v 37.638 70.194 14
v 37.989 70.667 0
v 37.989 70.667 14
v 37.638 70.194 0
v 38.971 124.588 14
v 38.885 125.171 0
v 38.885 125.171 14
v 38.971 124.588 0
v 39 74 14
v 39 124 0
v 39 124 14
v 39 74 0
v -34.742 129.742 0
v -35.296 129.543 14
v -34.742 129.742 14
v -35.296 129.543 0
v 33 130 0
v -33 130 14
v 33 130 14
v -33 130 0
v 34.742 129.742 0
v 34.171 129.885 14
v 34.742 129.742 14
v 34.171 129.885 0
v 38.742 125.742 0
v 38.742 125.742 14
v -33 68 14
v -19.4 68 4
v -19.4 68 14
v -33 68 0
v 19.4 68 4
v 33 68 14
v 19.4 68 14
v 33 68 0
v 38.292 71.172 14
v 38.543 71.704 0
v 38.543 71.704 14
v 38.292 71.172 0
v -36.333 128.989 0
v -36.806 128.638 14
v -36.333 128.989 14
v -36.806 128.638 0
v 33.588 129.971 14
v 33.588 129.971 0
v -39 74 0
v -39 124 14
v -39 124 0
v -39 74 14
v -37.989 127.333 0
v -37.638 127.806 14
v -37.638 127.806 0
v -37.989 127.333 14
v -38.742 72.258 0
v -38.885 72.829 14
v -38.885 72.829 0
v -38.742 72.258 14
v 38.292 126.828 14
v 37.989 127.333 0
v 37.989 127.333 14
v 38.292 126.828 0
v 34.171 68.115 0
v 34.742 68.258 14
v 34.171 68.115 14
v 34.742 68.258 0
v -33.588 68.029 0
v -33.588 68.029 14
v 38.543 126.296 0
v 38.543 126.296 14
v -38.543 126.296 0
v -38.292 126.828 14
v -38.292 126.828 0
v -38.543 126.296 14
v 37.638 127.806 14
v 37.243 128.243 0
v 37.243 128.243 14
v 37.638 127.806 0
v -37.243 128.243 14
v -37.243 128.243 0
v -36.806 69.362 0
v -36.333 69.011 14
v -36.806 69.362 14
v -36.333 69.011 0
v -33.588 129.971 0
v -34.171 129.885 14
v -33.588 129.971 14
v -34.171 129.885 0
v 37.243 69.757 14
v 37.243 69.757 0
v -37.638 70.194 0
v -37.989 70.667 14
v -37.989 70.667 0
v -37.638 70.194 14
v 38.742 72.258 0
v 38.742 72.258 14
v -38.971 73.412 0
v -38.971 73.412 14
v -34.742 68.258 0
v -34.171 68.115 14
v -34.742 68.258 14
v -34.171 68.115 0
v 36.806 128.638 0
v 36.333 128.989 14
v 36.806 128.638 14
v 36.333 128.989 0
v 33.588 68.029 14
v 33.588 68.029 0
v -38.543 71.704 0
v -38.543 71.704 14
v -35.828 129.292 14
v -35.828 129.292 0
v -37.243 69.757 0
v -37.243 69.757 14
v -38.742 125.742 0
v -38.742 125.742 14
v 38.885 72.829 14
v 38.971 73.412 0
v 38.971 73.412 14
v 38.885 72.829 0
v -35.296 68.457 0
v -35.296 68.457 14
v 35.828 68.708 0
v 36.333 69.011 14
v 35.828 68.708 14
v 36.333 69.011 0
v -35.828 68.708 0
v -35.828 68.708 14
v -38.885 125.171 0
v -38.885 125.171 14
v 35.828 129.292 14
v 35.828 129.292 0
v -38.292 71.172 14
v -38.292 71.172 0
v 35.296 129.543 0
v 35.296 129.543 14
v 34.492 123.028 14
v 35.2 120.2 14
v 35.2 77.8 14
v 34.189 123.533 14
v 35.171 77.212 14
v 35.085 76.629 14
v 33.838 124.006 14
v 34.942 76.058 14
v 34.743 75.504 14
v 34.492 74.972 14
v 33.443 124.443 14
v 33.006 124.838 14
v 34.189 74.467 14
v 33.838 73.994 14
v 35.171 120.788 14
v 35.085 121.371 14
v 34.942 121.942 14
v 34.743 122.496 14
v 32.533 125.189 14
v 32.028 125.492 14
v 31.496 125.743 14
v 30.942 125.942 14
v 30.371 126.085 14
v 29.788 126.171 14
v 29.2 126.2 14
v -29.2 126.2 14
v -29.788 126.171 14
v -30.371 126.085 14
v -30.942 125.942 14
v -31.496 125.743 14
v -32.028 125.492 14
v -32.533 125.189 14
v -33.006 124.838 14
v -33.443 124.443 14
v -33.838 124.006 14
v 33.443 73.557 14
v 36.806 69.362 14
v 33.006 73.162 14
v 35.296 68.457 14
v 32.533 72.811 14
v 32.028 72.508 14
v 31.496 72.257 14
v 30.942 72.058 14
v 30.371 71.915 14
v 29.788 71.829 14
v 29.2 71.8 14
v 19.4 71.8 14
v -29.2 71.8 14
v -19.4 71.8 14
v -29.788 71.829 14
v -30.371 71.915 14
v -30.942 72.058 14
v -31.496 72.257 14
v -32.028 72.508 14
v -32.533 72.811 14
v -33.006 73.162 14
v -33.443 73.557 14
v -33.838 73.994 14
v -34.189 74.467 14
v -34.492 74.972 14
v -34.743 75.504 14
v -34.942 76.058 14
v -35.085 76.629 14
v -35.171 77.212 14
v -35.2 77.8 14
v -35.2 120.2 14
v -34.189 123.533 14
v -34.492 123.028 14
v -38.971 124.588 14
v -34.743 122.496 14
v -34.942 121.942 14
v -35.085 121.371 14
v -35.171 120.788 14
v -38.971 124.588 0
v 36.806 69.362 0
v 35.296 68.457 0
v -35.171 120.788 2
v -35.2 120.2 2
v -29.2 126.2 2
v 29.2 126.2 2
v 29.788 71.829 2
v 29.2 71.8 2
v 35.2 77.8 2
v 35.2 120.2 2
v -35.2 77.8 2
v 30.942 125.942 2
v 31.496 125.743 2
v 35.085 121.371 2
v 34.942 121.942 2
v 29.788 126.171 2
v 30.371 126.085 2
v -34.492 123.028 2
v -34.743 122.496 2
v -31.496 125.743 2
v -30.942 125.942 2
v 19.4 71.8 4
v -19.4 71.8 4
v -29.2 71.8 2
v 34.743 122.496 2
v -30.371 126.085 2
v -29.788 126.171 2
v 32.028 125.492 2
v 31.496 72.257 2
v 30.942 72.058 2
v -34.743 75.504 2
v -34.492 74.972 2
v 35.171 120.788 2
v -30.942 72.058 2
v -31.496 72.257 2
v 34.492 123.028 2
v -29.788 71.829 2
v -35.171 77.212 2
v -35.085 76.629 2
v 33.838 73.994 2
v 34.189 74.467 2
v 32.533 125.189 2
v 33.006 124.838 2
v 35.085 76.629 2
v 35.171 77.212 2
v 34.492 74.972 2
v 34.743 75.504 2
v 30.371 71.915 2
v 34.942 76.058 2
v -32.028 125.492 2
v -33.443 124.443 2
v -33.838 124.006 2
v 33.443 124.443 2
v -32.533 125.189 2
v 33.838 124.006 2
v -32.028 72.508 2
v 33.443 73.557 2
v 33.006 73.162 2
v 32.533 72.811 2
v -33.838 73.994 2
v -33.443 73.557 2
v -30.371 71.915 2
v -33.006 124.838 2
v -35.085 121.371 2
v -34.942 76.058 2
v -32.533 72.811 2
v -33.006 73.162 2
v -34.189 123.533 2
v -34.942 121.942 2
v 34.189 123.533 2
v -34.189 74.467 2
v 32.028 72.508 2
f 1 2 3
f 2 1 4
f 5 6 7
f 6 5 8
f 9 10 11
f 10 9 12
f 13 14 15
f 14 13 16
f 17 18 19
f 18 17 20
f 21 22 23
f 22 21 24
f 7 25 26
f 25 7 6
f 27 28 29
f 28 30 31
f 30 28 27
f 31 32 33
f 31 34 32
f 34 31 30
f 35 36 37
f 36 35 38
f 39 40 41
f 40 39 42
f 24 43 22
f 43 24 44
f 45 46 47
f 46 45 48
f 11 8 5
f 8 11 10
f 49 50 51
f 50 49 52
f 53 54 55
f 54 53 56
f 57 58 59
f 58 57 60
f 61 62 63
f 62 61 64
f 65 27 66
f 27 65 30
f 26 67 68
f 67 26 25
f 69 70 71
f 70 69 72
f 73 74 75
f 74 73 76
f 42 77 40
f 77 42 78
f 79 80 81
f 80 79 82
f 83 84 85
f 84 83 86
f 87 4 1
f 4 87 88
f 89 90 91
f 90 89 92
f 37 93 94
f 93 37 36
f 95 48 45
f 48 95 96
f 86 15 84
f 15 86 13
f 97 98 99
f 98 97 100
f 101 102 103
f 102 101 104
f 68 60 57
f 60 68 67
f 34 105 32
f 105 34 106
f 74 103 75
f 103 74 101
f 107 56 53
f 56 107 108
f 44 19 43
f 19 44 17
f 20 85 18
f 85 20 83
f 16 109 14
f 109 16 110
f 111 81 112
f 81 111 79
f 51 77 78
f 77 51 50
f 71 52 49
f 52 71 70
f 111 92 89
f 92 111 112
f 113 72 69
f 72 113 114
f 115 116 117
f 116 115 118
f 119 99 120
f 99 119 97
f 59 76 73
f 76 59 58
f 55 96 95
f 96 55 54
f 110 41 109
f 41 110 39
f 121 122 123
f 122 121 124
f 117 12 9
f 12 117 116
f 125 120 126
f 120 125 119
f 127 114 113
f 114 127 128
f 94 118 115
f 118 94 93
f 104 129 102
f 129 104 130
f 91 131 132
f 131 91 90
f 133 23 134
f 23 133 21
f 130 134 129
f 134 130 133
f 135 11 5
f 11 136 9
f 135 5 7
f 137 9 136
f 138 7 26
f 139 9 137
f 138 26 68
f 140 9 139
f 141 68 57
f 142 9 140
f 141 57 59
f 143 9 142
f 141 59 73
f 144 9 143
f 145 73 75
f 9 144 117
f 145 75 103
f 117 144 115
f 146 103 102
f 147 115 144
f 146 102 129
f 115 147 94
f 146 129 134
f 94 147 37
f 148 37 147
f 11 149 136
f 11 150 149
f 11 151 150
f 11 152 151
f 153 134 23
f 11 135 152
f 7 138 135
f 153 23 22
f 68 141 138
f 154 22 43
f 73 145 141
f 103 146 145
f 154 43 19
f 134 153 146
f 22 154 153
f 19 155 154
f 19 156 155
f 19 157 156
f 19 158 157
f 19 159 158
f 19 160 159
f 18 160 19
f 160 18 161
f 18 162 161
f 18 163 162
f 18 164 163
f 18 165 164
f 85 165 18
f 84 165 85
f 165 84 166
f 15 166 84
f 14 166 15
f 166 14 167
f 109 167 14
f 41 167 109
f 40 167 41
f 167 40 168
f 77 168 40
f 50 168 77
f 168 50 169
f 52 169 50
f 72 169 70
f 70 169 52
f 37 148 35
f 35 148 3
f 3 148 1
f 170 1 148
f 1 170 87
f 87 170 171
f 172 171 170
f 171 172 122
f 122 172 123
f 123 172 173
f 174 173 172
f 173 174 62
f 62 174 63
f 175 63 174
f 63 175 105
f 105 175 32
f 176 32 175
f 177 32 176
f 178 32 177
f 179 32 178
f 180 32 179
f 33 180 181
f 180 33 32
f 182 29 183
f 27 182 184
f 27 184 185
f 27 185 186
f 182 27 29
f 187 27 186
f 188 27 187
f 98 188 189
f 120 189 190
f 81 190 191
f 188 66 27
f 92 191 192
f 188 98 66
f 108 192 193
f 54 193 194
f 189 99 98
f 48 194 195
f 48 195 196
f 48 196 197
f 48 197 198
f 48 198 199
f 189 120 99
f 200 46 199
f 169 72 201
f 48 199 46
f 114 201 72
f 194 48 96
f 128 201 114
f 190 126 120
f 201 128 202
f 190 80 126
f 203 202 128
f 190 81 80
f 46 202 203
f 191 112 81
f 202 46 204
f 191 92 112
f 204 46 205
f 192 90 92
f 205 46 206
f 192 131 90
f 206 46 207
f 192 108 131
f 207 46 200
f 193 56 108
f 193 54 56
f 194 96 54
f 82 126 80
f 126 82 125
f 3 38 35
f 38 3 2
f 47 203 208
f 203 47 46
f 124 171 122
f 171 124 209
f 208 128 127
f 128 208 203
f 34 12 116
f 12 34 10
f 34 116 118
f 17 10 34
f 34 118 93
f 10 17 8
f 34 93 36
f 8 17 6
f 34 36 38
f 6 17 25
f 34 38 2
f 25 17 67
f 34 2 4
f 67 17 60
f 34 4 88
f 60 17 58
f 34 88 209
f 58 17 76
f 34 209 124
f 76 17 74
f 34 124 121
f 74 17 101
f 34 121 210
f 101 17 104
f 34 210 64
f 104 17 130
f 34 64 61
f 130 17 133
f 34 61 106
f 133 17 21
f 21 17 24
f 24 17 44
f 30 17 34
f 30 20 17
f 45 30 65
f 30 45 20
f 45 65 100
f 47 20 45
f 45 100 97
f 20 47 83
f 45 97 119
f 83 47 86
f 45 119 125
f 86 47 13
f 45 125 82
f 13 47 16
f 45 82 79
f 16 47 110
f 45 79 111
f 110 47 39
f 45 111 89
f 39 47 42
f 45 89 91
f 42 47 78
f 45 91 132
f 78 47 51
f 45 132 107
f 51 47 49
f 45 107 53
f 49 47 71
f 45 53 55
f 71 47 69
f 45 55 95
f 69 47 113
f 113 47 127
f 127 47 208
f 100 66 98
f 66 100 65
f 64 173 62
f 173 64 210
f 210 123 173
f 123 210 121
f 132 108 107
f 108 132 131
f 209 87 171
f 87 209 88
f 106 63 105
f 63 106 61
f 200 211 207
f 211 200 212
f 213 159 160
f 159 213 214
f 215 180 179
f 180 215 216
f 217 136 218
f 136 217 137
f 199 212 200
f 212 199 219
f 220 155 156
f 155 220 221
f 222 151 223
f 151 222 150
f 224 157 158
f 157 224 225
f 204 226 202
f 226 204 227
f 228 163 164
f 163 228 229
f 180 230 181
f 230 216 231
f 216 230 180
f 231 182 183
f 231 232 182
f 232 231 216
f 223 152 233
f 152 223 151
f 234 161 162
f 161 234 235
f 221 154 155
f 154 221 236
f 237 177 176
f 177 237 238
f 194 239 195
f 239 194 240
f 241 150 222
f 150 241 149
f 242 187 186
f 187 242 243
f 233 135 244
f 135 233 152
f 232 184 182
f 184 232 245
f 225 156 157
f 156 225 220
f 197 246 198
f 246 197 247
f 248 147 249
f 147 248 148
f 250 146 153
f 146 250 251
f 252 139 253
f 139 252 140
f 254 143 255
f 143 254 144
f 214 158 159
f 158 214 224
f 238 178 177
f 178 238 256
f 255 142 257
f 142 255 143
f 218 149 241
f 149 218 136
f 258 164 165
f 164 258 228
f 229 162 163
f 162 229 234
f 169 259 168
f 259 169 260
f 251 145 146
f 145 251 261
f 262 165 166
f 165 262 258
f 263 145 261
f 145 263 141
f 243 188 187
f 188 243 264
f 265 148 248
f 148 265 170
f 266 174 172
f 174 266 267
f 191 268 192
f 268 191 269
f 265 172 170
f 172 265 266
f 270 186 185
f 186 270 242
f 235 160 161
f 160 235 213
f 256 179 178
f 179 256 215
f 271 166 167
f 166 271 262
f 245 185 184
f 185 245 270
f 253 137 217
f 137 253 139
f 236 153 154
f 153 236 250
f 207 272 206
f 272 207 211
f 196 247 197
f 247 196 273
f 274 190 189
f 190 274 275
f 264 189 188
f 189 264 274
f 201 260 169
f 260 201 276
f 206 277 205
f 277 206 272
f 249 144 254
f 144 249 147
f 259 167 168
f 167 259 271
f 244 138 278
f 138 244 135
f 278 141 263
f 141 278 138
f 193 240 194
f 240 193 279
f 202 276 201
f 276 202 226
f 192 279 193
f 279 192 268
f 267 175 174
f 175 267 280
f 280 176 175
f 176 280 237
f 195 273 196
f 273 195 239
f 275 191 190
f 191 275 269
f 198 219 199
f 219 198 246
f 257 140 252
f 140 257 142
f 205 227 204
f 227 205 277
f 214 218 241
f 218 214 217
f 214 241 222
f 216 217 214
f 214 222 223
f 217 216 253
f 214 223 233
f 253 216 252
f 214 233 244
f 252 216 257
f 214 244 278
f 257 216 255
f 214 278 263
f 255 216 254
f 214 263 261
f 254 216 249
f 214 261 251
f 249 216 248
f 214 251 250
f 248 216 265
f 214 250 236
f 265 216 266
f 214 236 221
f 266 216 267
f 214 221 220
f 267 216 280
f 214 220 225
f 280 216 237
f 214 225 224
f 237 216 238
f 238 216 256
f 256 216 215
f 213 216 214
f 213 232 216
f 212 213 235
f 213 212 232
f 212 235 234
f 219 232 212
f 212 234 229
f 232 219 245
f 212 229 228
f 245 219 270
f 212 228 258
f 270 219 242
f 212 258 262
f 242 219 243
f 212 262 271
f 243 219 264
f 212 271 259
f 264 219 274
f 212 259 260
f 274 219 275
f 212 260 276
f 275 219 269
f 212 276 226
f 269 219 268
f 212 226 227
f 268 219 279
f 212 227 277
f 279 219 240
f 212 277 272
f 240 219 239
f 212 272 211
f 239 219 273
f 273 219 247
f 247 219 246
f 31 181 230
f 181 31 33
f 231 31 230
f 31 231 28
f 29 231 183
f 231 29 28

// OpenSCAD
// file: lib_v3.scad
// ============================================================================
// Shared geometry helpers for the v3 print set.   include <lib_v3.scad>;
// ============================================================================

// Wedge prism, centred on +X, spanning +/- ang/2, rising from z = 0.
module sector_prism(r, ang, h, seg = 64) {
    steps = max(4, ceil(ang / 2.5));   // ~2.5 deg chords, independent of ang
    linear_extrude(height = h)
        polygon(concat(
            [[0, 0]],
            [for (i = [0 : steps])
                let (a = -ang / 2 + ang * i / steps) [r * cos(a), r * sin(a)]]
        ));
}

// Annular sector prism, centred on +X, rising from z = 0.
module ring_sector(r_in, r_out, ang, h, seg = 64) {
    difference() {
        sector_prism(r_out, ang, h, seg);
        translate([0, 0, -0.05]) cylinder(h = h + 0.1, r = r_in, $fn = seg);
    }
}

module tube(od, id, h) {
    difference() {
        cylinder(h = h, d = od);
        translate([0, 0, -0.05]) cylinder(h = h + 0.1, d = id);
    }
}

// Inward ledge with a 45 deg self-supporting underside. Top face at z_top.
module chamfered_ledge(r_wall, w, z_top) {
    rotate_extrude(convexity = 4)
        polygon([[r_wall - w, z_top],
                 [r_wall,     z_top],
                 [r_wall,     z_top - w]]);
}

// Thin slab used as a hull station for the chute trough.
module station_slab(y, z, w, t = 0.6) {
    translate([-w / 2, y - t / 2, z]) cube([w, t, 0.6]);
}
// file: parameters_v3.scad
// ============================================================================
// Automated Pill Dispenser — v3 "integral deck + open carousel"
// Shared parametric dimensions.   include <parameters_v3.scad>;
//
// z = 0 is the underside of the base body; the base cover hangs below it, so
// the table plane is z = base_z. +Y is the front (chute, tray, camera).
//
// Mechanism: the deck holds the pills in. It has ONE wedge opening. The unit
// parks with the JUST-EMPTIED compartment sitting over that opening, so
// nothing can leak; a 45 deg step sweeps the next compartment across the
// opening and gravity empties it. One servo, no gate, no carousel floor.
//
// Sizing rule that makes the park state leak-proof: the opening's angular
// width must fit inside one compartment's interior with margin to spare, at
// the opening's INNER radius (where a divider subtends the most angle):
//
//     open_deg  <=  360/car_n - 2*asin(div_t / (2*open_r_in)) - 2*park_margin
//     24        <=  45        - 8.6                           - 2*6.2
//
// Widening the opening or moving it inward eats the parking margin.
// ============================================================================

// ---------------------------------------------------------------- print / fit
layer_h        = 0.2;
nozzle_d       = 0.4;
wall           = 3.0;
fit_slip       = 0.35;
fit_press      = 0.10;
m3_pilot_d     = 2.55;
m3_free_d      = 3.35;
m2_pilot_d     = 1.65;
m2_free_d      = 2.30;

// ---------------------------------------------------------------- drum
h_od           = 120.0;
h_id           = h_od - 2 * wall;          // 114
h_ri           = h_id / 2;                 // 57
rim_z          = 94.0;                     // top of the deck body wall

// ---------------------------------------------------------------- deck (A3)
deck_z         = 52.0;                     // deck underside / body split plane
deck_t         = 5.0;                      // structural: the deck IS the drum
deck_top       = deck_z + deck_t;          // 57
deck_fillet    = 1.2;                      // fillet where the wall meets the deck

// The one opening.
open_deg       = 24.0;
open_r_in      = 16.0;
open_r_out     = h_ri;                     // breaches the bore: nothing rides past
open_ctr       = 90.0;                     // front (+Y)
open_relief    = 1.2;                      // lead-in relief on the deck top face

// Centre pilot: the carousel's only bearing. Post on the deck, journal in the
// hub, so the drive shaft never carries weight.
pilot_d        = 10.0;
pilot_engage   = 2.75;

// Body joint: three ears outside the drum. Concentricity between bodies is not
// critical — the running surface and the bore are both on the deck body.
ear_angles     = [30, 150, 270];
ear_w          = 18.0;
ear_out        = 7.0;
ear_t          = 8.0;

// ---------------------------------------------------------------- carousel (C3)
car_n          = 8;
car_pitch      = 360 / car_n;              // 45
car_od         = h_id - 1.4;               // 112.6 -> 0.7 mm sweep gap per side
car_r          = car_od / 2;
div_t          = 2.4;
div_h          = 26.0;
div_chamfer    = 1.6;                      // clears the deck/wall fillet
hub_od         = 28.0;
car_gap        = 0.35;                     // divider to deck running gap
car_z          = deck_top + car_gap;       // 57.35
car_top        = car_z + div_h;            // 83.35
pilot_post_h   = car_gap + pilot_engage;   // 3.1
pilot_bore_d   = pilot_d + fit_slip;       // 10.35

// Derived parking margin, echoed by the parts so a bad edit is loud.
park_margin    = (car_pitch - 2 * asin(div_t / (2 * open_r_in)) - open_deg) / 2;

// ---------------------------------------------------------------- drive train
// Hex socket, deliberately loose: it passes torque but cannot side-load the
// carousel, so the pilot post alone defines the axis.
hex_af         = 7.0;
hex_slip       = 0.40;
hex_depth      = 8.0;

shaft_body_d   = 10.0;
shaft_head_d   = 26.0;
shaft_head_t   = 6.0;

// MG90S
servo_l        = 22.8;
servo_w        = 12.2;
servo_case_h   = 22.5;
servo_tab_span = 32.2;
servo_tab_t    = 2.5;
servo_shaft_in = 5.9;
servo_nose_h   = 6.0;
servo_shaft_h  = 4.7;

horn_disc_d    = 20.4;
horn_disc_h    = 4.2;
horn_hole_r    = 7.5;
horn_screw_n   = 4;
horn_boss_d    = 8.5;

// ---------------------------------------------------------------- bracket (E3)
brk_ctr        = 270.0;                    // rear wall, opposite the chute
brk_pad_w      = 26.0;
brk_pad_h      = 40.0;
brk_pad_t      = 6.0;
brk_pad_z0     = 72.0;
brk_screw_z    = [78.0, 90.0];             // through the wall, from outside
brk_arm_w      = 22.0;
brk_arm_t      = 8.0;
brk_arm_top    = 112.0;                    // = the servo flange plane
// The servo plate has to be thinner than the servo's nose (6 mm from flange to
// case top) or the drive shaft's head fouls it. The beam keeps its full depth.
brk_head_t     = 4.5;
brk_rib_h      = 12.0;
brk_web_h      = 26.0;                     // gusset depth at the wall

// ---------------------------------------------------------------- chute (B3)
chute_wall     = 2.4;
// The notch is only as wide as the pill passage, so the chute's own side walls
// overlap the remaining drum wall and fuse into it. Cut it any wider and the
// chute floats free of the housing.
// 0.4 mm wider than the chute's inside width so the notch's cut faces are not
// coplanar with the chute's wall faces. The walls still overlap the drum wall by
// 2.0 mm, which is what fuses the chute into the housing.
chute_win_w    = 32.8;
chute_win_z0   = 8.0;                            // below the ramp's underside
chute_win_z1   = deck_z;                         // open right up to the deck

// [ y, floor top z, inside width, side-wall top z, floor thickness ]
// The floor thickens toward the exit so its UNDERSIDE runs at 40-42 deg rather
// than following the 38-40 deg top surface: it keeps the overhang printable and
// puts the material where the chute cantilevers out of the wall.
chute_stations = [
    [17.0, 52.0, 14.0, 51.9, 2.4],
    [45.0, 30.0, 32.0, 51.8, 6.0],
    [57.0, 19.0, 32.0, 36.0, 6.0],
    [70.0,  8.0, 32.0, 24.0, 6.5],
];

// ---------------------------------------------------------------- tray (F3)
tray_y0        = 68.0;
tray_l         = 62.0;
tray_w         = 78.0;
tray_floor     = 2.0;
tray_h         = 14.0;
tray_mouth_h   = 4.0;                      // cut-down wall; the chute lip overhangs it

// ---------------------------------------------------------------- base (G3)
base_t         = 3.0;
base_z         = -base_t;                  // table plane
post_d         = 9.0;
post_r         = h_ri - post_d / 2 + 0.8;
post_angles    = [70, 190, 310];
cable_w        = 12.0;
cable_h        = 6.0;
// main file
// ============================================================================
// v3 PART F3 — catch tray, mouth flush with the chute walls
//
// The mouth wall is cut down so the chute lip overhangs into the well with no
// step for a tablet to catch on. Free-standing: lift it out to take the dose.
// Its flat floor is the camera's pill-count zone, so keep it matte.
// ============================================================================

include <parameters_v3.scad>;
include <lib_v3.scad>;

$fn = 64;

corner_r = 6.0;

module f3_shell(inset, h, z0) {
    x = tray_w - 2 * inset;
    y = tray_l - 2 * inset;
    translate([0, tray_y0 + tray_l / 2, z0])
        hull() for (ix = [-1, 1], iy = [-1, 1])
            translate([ix * (x / 2 - corner_r), iy * (y / 2 - corner_r), 0])
                cylinder(h = h, r = corner_r);
}

module catch_tray_v3() {
    difference() {
        f3_shell(0, tray_h, base_z);
        f3_shell(tray_floor + 1.8, tray_h, base_z + tray_floor);
        // Cut the mouth wall down to clear the chute lip.
        translate([-(chute_win_w / 2 + 3), tray_y0 - 1, base_z + tray_mouth_h])
            cube([chute_win_w + 6, 6, tray_h]);
    }
}

translate([0, 0, -base_z]) catch_tray_v3();

echo(str("F3 tray: ", tray_w, " x ", tray_l, " x ", tray_h,
         ", mouth wall ", tray_mouth_h, " mm vs chute lip at z ",
         chute_stations[len(chute_stations) - 1][1]));
